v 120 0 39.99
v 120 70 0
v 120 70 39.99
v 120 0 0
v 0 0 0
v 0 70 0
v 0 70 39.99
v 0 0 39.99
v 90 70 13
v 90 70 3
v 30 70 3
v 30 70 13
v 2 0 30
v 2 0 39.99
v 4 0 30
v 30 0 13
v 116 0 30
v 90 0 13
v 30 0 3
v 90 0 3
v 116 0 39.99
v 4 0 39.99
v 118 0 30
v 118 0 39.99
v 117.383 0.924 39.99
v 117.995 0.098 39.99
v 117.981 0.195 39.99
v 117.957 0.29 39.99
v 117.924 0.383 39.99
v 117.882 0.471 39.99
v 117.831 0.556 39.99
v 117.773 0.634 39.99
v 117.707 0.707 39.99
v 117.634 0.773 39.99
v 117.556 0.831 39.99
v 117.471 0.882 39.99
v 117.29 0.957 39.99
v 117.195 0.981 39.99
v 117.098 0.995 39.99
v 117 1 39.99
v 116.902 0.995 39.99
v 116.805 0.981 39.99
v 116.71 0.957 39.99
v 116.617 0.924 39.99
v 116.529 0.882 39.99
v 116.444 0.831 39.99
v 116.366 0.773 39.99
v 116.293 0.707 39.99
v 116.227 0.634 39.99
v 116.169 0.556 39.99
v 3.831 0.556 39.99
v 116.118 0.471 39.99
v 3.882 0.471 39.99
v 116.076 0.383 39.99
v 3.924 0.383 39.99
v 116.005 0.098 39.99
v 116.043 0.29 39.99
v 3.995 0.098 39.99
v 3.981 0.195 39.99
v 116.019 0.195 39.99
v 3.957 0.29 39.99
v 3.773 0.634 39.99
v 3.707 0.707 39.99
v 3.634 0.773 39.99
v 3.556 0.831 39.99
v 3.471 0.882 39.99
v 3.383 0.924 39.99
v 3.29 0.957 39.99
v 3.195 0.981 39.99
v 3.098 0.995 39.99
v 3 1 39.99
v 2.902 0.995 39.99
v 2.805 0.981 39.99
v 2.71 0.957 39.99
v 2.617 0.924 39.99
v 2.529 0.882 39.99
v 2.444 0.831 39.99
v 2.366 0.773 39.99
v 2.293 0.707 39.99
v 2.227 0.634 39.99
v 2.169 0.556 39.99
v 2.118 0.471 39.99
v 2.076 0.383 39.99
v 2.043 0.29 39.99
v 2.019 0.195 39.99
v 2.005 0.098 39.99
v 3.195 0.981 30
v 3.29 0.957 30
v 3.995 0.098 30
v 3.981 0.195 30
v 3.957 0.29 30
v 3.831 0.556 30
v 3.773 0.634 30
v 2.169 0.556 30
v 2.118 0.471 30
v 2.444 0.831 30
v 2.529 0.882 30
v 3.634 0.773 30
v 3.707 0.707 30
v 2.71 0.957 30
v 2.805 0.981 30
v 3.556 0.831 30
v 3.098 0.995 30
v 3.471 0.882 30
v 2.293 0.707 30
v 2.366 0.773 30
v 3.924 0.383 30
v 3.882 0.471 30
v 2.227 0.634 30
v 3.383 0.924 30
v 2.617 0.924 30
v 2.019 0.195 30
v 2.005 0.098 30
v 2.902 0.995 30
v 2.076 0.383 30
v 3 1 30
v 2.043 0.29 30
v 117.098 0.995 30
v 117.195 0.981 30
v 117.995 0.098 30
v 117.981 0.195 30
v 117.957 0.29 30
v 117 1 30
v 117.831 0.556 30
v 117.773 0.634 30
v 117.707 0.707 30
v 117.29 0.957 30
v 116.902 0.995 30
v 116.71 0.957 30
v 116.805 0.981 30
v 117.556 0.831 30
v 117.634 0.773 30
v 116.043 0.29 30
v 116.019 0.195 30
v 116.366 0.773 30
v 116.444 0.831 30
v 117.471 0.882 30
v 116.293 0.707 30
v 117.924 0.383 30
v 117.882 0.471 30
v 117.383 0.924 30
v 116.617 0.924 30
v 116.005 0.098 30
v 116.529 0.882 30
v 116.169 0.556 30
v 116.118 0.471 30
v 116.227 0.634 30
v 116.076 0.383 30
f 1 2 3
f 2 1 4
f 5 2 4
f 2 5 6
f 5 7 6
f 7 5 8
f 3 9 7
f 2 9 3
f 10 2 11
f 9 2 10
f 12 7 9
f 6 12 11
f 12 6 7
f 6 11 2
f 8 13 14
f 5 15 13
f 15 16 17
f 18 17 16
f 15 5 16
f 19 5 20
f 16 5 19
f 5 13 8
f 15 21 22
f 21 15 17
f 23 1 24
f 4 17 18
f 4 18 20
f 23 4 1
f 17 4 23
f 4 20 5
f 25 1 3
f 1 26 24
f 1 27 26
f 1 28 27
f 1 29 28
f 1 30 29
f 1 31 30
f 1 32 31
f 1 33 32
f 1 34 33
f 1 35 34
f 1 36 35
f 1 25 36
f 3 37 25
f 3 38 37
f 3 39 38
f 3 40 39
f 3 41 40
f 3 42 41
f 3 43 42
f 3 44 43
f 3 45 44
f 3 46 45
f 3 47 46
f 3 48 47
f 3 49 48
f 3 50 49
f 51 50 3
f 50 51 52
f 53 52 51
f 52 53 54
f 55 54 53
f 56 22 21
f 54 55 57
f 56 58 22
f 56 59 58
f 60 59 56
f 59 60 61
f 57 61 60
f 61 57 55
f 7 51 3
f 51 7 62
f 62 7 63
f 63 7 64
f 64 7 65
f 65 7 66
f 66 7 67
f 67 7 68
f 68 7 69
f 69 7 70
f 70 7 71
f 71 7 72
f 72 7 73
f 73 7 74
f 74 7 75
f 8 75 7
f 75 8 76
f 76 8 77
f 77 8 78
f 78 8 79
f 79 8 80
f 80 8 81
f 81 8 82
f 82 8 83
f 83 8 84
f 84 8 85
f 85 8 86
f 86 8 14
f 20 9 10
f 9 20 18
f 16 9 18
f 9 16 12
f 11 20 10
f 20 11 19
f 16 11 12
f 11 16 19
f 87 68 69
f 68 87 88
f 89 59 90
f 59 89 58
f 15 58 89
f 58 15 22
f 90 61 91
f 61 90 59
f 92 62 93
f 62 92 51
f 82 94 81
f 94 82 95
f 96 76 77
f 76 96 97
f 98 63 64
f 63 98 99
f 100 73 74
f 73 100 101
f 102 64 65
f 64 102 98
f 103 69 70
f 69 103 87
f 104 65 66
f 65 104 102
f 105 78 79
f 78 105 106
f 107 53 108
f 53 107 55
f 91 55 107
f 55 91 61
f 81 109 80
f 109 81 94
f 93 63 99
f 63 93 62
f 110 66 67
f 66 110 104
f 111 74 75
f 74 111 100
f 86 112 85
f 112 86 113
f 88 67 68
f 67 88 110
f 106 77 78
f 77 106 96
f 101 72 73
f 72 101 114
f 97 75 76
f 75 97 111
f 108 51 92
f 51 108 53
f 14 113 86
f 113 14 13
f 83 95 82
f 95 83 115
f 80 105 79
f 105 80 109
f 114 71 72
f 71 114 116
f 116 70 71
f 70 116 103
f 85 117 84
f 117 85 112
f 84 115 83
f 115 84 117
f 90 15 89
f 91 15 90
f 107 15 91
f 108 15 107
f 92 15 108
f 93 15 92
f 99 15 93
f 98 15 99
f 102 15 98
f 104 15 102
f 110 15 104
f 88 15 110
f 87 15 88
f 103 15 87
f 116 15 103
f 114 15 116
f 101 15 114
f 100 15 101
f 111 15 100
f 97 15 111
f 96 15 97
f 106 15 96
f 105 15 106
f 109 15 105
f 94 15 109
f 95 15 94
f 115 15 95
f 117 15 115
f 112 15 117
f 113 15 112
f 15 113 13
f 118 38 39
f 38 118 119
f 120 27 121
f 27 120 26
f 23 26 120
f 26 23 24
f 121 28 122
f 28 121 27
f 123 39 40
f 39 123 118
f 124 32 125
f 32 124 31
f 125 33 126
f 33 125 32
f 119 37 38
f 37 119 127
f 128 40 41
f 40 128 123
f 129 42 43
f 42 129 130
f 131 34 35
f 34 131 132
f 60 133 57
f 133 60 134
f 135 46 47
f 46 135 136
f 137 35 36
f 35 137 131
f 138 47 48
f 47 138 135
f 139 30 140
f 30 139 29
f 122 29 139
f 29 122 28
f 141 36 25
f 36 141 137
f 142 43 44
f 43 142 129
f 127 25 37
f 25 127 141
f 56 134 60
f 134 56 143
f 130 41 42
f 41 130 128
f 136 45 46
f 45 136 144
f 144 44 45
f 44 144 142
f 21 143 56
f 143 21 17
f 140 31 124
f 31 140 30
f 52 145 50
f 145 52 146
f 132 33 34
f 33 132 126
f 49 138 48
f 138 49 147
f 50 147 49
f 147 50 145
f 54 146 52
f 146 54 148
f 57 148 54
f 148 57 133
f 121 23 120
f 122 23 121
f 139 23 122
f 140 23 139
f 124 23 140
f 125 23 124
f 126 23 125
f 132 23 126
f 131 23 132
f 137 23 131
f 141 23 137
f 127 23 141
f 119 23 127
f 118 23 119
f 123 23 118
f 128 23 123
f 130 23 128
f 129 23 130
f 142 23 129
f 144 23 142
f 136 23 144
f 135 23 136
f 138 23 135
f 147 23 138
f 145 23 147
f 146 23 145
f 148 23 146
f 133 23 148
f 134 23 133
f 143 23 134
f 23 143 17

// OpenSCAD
// Buffer Tank for Mini Horizontal Gel Electrophoresis
// Units: millimetres

// Outer Dimensions
$outer_width_x = 120; // X
$outer_width_y = 70;  // Y
$outer_height_z = 40; // Z

// Wall and Floor Thickness
$wall_thickness = 3;
$floor_thickness = 3;

// Platform Dimensions
$platform_length_x = 60; // Length in X (centred)
$platform_width_y = $outer_width_y; // Spans full inner width (Y)
$platform_height_rel_inner = 10; // Height above inner floor

// Electrode Hole Dimensions
$hole_diameter = 2;
$hole_y_pos = 0;
$hole_z_pos = 30;

// Quality Settings
$fn = 64;

// Calculate Inner Dimensions
$inner_width_x = $outer_width_x - 2 * $wall_thickness;
$inner_width_y = $outer_width_y - 2 * $wall_thickness;
$inner_height_z = $outer_height_z - $floor_thickness - $wall_thickness;

// Calculate Platform Top Z
// Inner floor is at Z = $floor_thickness
// Platform top is at Z = $floor_thickness + $platform_height_rel_inner
$platform_top_z = $floor_thickness + $platform_height_rel_inner;

// Start modeling
difference() {
    // 1. Main Tank Body (Open Top)
    // Outer box minus top face
    cube([
        $outer_width_x, 
        $outer_width_y, 
        $outer_height_z
    ], center = false);
    
    // Cut open top (extend slightly past top face)
    translate([0, 0, $outer_height_z - 0.01]) {
        cube([
            $outer_width_x, 
            $outer_width_y, 
            0.02
        ]);
    }

    // 2. Internal Platform
    // Position: Centred in X, Full Width in Y, Sitting on inner floor
    // The platform spans the FULL inner width (Y).
    // Inner Y range: 3 to 67. Center Y = 35.
    // Platform Y range: 3 to 67. Center Y = 35.
    // Platform X range: (120-60)/2 = 30 to 90. Center X = 60.
    translate([
        ($outer_width_x / 2) - ($platform_length_x / 2), 
        ($outer_width_y / 2) - ($platform_width_y / 2), 
        $floor_thickness
    ]) {
        // Platform is a solid block
        cube([
            $platform_length_x, 
            $platform_width_y, 
            $platform_height_rel_inner
        ]);
    }

    // 3. Electrode Holes
    // Two holes: Left and Right ends of the tank.
    // Hole center X: 
    // Left Wall X center: $wall_thickness (3)
    // Right Wall X center: $outer_width_x - $wall_thickness (117)
    // Hole center Y: $hole_y_pos (0)
    // Hole center Z: $hole_z_pos (30)
    // Hole Radius
    $hole_radius = $hole_diameter / 2;
    
    // Left Hole
    translate([
        $wall_thickness, 
        $hole_y_pos, 
        $hole_z_pos
    ]) {
        cylinder(
            h = $outer_height_z, 
            r = $hole_radius, 
            center = false
        );
    }
    
    // Right Hole
    translate([
        $outer_width_x - $wall_thickness, 
        $hole_y_pos, 
        $hole_z_pos
    ]) {
        cylinder(
            h = $outer_height_z, 
            r = $hole_radius, 
            center = false
        );
    }
}
